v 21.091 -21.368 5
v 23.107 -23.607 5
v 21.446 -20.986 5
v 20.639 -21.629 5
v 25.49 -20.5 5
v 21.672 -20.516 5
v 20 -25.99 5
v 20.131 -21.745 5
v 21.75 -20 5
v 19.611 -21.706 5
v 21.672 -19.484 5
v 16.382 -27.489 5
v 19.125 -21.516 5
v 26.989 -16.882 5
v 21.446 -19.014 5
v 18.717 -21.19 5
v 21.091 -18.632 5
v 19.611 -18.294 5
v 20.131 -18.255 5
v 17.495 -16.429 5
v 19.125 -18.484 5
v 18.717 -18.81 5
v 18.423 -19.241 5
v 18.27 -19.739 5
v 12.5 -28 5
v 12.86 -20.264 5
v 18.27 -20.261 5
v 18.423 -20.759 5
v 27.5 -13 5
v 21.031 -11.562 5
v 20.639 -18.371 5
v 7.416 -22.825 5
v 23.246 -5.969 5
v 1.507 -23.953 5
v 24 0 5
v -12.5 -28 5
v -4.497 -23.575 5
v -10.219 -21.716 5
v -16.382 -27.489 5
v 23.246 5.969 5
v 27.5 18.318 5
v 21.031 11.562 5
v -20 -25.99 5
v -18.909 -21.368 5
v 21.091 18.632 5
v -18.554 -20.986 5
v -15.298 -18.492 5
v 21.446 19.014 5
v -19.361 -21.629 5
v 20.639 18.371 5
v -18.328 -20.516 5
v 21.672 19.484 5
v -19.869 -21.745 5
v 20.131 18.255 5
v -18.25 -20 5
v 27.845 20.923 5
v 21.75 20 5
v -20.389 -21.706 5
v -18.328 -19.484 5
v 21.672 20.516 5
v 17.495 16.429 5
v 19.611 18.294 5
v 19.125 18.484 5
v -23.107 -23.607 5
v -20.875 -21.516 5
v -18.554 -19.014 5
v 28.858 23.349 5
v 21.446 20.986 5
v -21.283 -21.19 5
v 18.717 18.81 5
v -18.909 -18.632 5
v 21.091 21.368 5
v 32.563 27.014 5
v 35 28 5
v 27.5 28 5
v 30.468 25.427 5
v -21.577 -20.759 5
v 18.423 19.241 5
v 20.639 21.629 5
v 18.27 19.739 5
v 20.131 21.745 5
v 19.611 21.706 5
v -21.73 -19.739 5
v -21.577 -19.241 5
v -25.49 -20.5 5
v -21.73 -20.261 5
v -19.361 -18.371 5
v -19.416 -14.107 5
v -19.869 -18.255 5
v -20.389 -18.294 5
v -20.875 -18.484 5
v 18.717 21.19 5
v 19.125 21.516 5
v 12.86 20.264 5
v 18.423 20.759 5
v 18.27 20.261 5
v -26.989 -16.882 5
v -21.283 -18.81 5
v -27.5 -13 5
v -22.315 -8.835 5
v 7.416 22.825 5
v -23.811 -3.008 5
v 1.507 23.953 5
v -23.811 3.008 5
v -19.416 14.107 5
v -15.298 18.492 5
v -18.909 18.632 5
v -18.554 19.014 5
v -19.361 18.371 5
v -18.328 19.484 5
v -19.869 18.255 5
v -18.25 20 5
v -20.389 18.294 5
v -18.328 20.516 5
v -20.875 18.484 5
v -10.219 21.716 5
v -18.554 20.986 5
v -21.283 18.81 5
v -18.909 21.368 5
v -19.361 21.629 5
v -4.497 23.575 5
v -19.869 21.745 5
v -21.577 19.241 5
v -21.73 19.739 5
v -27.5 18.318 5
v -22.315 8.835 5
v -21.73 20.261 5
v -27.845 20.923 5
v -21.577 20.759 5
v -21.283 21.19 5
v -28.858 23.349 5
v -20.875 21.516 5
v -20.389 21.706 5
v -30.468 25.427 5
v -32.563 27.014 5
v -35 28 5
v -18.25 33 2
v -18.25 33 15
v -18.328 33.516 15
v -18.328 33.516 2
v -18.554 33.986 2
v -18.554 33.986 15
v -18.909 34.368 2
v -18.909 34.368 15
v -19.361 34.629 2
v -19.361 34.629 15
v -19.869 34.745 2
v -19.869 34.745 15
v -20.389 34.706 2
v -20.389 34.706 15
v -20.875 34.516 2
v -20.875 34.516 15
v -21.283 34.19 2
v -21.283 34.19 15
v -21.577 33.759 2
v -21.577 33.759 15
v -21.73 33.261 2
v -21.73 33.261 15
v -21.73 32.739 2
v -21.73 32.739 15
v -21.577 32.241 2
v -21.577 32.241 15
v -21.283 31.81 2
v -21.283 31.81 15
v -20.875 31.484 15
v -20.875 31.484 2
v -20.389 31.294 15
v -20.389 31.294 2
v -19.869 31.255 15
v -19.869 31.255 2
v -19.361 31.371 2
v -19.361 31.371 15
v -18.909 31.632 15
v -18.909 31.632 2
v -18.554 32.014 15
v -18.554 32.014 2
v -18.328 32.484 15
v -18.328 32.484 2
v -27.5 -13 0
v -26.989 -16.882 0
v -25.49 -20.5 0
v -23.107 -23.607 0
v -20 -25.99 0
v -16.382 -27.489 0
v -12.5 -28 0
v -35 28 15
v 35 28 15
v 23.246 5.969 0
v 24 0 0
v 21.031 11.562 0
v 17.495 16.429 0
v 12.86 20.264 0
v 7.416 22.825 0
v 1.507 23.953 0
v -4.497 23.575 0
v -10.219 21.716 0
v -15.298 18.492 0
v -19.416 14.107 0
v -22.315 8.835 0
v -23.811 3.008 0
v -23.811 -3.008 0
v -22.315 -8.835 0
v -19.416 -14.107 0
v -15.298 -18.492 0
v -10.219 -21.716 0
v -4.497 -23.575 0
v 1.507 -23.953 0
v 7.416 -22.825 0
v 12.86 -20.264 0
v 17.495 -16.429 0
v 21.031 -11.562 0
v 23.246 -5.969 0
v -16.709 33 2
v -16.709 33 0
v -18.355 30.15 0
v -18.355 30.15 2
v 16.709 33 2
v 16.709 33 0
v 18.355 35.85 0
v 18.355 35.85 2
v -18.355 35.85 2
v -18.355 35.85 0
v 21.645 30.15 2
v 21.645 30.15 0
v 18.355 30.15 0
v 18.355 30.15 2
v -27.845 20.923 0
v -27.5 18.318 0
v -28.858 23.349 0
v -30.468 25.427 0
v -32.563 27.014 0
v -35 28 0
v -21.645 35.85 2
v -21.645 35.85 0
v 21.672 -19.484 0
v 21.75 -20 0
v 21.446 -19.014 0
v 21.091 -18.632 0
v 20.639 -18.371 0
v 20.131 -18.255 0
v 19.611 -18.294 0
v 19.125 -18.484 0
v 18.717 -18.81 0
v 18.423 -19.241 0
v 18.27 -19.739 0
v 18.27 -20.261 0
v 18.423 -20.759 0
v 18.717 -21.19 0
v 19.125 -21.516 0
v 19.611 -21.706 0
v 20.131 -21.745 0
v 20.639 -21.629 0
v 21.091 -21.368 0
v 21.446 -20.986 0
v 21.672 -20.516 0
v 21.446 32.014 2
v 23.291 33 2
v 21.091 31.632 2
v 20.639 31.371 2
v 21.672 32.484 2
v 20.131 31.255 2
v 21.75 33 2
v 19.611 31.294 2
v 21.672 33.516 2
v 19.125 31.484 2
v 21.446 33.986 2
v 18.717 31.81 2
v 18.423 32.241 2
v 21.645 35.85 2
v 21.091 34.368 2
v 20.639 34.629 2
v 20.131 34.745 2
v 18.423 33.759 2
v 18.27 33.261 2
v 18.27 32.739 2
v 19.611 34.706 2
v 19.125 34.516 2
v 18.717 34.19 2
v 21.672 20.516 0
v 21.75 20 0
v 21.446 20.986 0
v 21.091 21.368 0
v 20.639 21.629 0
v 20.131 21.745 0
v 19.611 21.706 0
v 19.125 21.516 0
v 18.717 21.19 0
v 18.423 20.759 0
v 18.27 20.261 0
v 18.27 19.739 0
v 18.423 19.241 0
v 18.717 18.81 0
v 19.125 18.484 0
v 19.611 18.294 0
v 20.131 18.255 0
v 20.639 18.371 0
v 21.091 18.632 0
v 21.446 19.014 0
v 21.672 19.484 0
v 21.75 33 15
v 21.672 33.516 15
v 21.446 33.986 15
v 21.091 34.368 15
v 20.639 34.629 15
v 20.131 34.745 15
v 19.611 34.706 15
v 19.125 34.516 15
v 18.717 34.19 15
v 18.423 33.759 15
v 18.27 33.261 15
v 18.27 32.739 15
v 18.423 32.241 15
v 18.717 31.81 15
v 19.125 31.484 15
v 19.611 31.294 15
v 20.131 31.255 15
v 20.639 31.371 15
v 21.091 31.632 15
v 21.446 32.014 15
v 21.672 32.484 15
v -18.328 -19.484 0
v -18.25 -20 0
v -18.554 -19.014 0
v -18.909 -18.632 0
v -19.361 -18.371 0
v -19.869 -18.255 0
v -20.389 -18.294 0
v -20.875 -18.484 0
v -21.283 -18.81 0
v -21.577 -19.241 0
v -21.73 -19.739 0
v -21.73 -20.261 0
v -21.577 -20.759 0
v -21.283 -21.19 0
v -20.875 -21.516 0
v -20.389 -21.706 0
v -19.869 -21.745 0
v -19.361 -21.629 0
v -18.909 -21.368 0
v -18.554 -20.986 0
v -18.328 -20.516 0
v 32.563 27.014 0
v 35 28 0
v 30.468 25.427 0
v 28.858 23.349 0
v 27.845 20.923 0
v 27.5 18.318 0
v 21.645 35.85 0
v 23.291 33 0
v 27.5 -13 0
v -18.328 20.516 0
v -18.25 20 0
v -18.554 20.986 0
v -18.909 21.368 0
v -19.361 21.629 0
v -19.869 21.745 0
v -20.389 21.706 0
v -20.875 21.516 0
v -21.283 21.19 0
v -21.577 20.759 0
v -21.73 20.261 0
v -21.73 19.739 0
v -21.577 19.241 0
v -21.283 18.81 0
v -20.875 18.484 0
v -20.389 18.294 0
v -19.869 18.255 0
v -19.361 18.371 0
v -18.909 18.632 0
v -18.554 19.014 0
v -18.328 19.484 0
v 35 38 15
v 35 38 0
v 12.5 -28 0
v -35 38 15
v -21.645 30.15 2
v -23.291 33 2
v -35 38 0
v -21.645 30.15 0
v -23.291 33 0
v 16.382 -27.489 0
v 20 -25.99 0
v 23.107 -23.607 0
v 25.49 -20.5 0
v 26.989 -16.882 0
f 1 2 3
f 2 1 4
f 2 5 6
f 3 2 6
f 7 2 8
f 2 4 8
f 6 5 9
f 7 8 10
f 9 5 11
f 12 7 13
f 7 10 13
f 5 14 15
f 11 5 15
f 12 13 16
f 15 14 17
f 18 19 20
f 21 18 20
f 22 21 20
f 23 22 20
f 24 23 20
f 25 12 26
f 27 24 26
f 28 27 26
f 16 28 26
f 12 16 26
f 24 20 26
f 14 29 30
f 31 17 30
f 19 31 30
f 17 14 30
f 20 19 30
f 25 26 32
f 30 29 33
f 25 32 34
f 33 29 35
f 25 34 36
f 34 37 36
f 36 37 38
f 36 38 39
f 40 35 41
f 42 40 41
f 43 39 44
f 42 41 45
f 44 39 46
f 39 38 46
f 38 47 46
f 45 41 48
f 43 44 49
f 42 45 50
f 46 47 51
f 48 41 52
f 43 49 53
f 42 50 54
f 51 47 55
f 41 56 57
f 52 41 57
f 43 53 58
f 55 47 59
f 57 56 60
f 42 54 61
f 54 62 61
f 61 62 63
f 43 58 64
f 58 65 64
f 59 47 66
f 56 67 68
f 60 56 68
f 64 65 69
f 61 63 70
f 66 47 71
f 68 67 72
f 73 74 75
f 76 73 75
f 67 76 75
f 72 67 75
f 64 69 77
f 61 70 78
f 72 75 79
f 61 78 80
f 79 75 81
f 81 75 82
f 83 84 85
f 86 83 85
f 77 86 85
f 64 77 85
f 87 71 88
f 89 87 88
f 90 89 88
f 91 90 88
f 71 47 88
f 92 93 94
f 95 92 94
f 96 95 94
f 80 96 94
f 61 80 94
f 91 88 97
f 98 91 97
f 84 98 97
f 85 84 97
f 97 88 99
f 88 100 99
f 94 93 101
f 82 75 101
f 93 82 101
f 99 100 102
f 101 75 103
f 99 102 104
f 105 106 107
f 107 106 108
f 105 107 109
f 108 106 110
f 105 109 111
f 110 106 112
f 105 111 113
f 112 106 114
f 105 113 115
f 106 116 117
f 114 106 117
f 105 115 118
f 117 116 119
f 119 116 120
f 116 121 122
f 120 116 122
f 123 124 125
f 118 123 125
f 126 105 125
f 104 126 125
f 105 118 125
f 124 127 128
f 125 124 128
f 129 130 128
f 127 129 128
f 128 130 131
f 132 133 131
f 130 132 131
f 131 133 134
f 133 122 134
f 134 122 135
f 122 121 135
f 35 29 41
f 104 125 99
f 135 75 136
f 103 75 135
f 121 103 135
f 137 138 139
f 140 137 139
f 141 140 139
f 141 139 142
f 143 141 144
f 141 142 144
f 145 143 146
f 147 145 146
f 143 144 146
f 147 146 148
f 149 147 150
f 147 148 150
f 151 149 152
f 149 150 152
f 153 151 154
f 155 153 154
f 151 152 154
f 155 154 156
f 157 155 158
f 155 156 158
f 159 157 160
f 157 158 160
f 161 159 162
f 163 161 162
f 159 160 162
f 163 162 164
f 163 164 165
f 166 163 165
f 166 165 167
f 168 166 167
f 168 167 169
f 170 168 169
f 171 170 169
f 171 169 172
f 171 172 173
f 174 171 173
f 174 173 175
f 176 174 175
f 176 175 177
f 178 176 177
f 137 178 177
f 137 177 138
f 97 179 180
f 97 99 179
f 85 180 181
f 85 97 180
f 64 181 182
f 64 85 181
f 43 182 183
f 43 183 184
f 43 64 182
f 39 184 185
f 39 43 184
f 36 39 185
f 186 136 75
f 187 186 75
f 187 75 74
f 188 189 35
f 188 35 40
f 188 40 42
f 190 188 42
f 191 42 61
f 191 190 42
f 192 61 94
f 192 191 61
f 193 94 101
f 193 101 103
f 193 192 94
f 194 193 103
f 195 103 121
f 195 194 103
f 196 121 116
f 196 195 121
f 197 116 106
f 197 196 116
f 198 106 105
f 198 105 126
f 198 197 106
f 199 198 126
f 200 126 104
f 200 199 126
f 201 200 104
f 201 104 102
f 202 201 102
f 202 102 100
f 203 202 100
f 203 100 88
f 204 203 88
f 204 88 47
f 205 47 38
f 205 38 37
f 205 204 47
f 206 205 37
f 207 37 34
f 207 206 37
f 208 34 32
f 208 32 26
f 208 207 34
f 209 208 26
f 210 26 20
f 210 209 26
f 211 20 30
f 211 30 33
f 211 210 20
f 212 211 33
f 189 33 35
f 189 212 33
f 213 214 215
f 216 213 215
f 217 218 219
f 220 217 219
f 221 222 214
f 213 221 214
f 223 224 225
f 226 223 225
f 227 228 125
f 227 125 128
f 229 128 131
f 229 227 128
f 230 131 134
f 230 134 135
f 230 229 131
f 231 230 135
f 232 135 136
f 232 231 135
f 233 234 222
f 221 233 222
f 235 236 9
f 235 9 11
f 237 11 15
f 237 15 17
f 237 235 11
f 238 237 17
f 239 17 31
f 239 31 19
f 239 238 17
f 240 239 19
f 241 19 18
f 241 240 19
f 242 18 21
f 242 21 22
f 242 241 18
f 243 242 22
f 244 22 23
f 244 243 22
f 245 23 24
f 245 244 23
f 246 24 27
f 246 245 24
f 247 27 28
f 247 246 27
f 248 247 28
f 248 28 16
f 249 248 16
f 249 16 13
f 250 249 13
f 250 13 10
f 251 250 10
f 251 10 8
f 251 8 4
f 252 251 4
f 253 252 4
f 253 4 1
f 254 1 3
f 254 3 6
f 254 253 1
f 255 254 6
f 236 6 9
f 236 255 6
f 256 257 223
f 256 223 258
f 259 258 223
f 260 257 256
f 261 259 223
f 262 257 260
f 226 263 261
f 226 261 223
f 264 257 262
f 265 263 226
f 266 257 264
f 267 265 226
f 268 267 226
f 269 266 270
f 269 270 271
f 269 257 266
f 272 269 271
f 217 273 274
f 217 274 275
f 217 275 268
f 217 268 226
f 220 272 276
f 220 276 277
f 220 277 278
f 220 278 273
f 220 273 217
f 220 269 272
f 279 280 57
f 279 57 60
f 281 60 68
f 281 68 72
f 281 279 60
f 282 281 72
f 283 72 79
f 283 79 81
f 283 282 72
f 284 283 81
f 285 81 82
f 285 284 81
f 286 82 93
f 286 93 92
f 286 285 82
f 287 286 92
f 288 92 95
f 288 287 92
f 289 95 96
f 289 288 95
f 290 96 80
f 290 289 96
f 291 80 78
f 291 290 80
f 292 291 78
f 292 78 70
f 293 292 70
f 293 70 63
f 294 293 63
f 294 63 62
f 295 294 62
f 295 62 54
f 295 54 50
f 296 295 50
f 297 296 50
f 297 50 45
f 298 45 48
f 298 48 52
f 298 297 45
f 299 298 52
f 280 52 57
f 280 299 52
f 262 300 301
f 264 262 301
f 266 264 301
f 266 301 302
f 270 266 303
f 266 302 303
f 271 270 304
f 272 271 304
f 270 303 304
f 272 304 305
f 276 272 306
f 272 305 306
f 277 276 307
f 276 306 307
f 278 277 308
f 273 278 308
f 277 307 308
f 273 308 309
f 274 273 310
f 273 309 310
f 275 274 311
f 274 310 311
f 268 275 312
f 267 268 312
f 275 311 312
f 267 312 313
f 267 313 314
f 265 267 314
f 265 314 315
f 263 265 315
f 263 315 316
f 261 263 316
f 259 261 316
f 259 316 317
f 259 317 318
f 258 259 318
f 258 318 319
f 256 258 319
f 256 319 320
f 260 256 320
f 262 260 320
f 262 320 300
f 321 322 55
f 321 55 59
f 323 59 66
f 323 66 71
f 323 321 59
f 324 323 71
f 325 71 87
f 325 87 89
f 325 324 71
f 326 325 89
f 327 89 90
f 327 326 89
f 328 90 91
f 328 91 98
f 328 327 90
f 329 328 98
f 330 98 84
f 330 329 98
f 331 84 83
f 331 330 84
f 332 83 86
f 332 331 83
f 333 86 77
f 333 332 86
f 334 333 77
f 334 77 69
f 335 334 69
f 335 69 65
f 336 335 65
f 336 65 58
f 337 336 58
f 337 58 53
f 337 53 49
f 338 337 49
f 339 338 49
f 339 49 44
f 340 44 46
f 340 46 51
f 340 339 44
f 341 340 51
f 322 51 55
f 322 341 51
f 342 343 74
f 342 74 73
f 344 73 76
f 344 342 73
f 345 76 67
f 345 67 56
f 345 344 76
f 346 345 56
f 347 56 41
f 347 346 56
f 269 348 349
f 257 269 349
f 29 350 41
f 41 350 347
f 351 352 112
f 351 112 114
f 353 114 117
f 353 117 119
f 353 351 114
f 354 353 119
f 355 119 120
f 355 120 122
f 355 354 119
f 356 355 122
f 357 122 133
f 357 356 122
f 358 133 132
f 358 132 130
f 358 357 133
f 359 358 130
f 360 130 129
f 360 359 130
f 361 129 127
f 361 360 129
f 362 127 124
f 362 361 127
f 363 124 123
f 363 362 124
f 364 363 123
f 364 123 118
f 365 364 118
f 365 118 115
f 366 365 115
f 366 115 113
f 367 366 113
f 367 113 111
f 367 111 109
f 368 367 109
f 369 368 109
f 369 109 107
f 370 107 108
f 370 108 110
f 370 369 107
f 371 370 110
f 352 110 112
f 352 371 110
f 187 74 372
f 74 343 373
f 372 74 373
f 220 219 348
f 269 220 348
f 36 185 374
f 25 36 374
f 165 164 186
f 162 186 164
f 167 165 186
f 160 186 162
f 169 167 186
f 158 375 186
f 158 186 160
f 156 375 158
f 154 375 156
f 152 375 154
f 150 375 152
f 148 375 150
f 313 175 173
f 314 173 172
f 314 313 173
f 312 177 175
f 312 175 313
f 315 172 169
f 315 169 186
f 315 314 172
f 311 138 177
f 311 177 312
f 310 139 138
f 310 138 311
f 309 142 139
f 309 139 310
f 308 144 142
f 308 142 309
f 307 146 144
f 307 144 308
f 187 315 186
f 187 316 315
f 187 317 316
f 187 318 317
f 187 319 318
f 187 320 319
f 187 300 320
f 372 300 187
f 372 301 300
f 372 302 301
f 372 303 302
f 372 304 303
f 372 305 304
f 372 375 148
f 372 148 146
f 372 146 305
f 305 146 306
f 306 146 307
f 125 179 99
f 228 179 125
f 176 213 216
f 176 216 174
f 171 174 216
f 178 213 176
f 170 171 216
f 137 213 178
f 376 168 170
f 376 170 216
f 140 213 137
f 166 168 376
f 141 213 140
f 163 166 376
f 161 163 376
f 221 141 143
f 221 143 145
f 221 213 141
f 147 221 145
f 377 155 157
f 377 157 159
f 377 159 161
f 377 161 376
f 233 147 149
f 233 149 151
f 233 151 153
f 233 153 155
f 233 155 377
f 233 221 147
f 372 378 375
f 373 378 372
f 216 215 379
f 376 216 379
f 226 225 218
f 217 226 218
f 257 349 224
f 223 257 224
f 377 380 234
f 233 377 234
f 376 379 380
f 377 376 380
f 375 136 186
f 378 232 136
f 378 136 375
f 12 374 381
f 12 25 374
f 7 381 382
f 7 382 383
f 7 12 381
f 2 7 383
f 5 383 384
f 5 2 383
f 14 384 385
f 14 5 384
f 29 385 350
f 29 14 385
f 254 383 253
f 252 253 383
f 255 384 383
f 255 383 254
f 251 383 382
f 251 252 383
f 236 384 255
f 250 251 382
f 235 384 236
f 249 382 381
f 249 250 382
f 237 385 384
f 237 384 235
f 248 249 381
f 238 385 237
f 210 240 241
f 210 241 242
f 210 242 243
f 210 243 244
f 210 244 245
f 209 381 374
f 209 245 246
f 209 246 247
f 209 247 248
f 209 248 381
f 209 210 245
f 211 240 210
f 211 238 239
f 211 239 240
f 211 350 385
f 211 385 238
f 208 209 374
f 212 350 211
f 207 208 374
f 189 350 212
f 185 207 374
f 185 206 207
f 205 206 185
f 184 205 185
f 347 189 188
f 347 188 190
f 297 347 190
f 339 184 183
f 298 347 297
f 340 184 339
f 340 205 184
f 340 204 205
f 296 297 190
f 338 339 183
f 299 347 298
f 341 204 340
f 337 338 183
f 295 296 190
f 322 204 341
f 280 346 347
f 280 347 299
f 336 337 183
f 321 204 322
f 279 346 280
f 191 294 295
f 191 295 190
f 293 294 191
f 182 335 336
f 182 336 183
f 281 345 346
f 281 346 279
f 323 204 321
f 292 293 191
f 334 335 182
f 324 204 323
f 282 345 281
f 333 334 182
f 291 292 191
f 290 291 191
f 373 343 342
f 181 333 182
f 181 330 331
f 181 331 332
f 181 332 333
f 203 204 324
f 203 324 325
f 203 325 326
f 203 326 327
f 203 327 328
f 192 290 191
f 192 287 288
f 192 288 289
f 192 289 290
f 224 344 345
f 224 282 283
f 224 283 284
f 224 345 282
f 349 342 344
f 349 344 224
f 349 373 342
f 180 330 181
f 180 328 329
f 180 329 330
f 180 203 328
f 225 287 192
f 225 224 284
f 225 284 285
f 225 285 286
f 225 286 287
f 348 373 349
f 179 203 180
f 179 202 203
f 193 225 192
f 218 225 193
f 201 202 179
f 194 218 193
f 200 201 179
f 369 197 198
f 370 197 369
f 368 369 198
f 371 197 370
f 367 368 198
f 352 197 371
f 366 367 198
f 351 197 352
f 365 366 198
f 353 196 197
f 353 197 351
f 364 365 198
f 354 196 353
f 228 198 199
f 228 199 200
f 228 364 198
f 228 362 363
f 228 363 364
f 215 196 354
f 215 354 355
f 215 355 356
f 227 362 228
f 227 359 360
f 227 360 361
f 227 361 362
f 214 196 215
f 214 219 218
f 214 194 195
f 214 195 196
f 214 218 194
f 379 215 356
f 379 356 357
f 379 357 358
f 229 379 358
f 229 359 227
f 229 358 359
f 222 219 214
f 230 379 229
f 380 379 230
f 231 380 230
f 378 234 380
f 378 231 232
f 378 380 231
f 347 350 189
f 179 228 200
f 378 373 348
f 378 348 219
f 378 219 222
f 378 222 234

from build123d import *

# Parameters (mm, degrees)
ESQUISSE1_W             = 55
ESQUISSE1_H             = 56
ESQUISSE1_R             = 1.75
ESQUISSE1_R_2           = 24
BOSS_EXTRU_1_DEPTH      = 5
CONG_1_R                = 15
ESQUISSE2_W             = 70
ESQUISSE2_H             = 10
BOSS_EXTRU_2_DEPTH      = 10
ESQUISSE3_R             = 1.75
ENL_V_MAT_EXTRU_1_DEPTH = 26
ENL_V_MAT_EXTRU_2_DEPTH = 2
CONG_2_R                = 10


with BuildPart() as part:
    # Esquisse1 → Boss.-Extru.1 (new body)
    # profile 1 of 2: a face of its own
    with BuildSketch(Plane.XY):
        Rectangle(ESQUISSE1_W, ESQUISSE1_H)
        with Locations((-20, -20)):
            Circle(ESQUISSE1_R, mode=Mode.SUBTRACT)
        with Locations((20, -20)):
            Circle(ESQUISSE1_R, mode=Mode.SUBTRACT)
        with Locations((20, 20)):
            Circle(ESQUISSE1_R, mode=Mode.SUBTRACT)
        with Locations((-20, 20)):
            Circle(ESQUISSE1_R, mode=Mode.SUBTRACT)
        Circle(ESQUISSE1_R_2, mode=Mode.SUBTRACT)
    # profile 2 of 2: a face of its own
    with BuildSketch(Plane.XY):
        Polygon((-35, 28), (-27.5, 28), (27.5, 28), (35, 28), (35, 38), (-35, 38), align=None)
    extrude(amount=BOSS_EXTRU_1_DEPTH)

    # Congé1
    cong_1_edges = [part.edges().sort_by_distance(p)[0] for p in [
        (27.5, -28, 2.5),
        (-27.5, -28, 2.5),
    ]]
    fillet(cong_1_edges, radius=CONG_1_R)

    # Esquisse2 → Boss.-Extru.2 (add)
    with BuildSketch(Plane.XY.offset(5)):
        with Locations((0, 33)):
            Rectangle(ESQUISSE2_W, ESQUISSE2_H)
    extrude(amount=BOSS_EXTRU_2_DEPTH)

    # Esquisse3 → Enlèv. mat.-Extru.1 (cut)
    with BuildSketch(Plane.XY.offset(15)):
        with Locations((-20, 33)):
            Circle(ESQUISSE3_R)
        with Locations((20, 33)):
            Circle(ESQUISSE3_R)
    extrude(amount=-ENL_V_MAT_EXTRU_1_DEPTH, mode=Mode.SUBTRACT)

    # Esquisse4 → Enlèv. mat.-Extru.2 (cut)
    with BuildSketch(Plane(origin=(0, 0, 0), x_dir=(-1, 0, 0), z_dir=(0, 0, -1))):
        Polygon((-16.709103466, 33), (-18.354551733, 35.85), (-21.645448267, 35.85), (-23.290896534, 33), (-21.645448267, 30.15), (-18.354551733, 30.15), align=None)
        Polygon((16.709103466, 33), (18.354551733, 30.15), (21.645448267, 30.15), (23.290896534, 33), (21.645448267, 35.85), (18.354551733, 35.85), align=None)
    extrude(amount=-ENL_V_MAT_EXTRU_2_DEPTH, mode=Mode.SUBTRACT)

    # Congé2
    # the kernel refuses this fillet: 10 mm, written as the material it adds along each edge
    with BuildSketch(Plane(origin=(-27.5, 28, 0), x_dir=(0, -1, 0), z_dir=(0, 0, 1))) as cong_2_piece_1:
        with BuildLine():
            CenterArc((9.682458366, -10), CONG_2_R, 90, 75.522487814)
            Line((0, -7.5), (-0.193649167, -7.45))
            ThreePointArc((-0.193649167, -7.45), (-0.2, -3.75), (-0.2, 0))
            Line((-0.2, 0), (0, 0.2))
            Line((0, 0.2), (9.682458366, 0.2))
            Line((9.682458366, 0.2), (9.682458366, 0))
        make_face()
    extrude(amount=5)
    with BuildSketch(Plane(origin=(27.5, 28, 0), x_dir=(1, 0, 0), z_dir=(0, 0, 1))) as cong_2_piece_2:
        with BuildLine():
            CenterArc((10, -9.682458366), CONG_2_R, 104.477512186, 75.522487814)
            Line((0, -9.682458366), (-0.2, -9.682458366))
            Line((-0.2, -9.682458366), (-0.2, 0))
            Line((-0.2, 0), (0, 0.2))
            ThreePointArc((0, 0.2), (3.75, 0.2), (7.45, 0.193649167))
            Line((7.45, 0.193649167), (7.5, 0))
        make_face()
    extrude(amount=5)


solid = part.part
